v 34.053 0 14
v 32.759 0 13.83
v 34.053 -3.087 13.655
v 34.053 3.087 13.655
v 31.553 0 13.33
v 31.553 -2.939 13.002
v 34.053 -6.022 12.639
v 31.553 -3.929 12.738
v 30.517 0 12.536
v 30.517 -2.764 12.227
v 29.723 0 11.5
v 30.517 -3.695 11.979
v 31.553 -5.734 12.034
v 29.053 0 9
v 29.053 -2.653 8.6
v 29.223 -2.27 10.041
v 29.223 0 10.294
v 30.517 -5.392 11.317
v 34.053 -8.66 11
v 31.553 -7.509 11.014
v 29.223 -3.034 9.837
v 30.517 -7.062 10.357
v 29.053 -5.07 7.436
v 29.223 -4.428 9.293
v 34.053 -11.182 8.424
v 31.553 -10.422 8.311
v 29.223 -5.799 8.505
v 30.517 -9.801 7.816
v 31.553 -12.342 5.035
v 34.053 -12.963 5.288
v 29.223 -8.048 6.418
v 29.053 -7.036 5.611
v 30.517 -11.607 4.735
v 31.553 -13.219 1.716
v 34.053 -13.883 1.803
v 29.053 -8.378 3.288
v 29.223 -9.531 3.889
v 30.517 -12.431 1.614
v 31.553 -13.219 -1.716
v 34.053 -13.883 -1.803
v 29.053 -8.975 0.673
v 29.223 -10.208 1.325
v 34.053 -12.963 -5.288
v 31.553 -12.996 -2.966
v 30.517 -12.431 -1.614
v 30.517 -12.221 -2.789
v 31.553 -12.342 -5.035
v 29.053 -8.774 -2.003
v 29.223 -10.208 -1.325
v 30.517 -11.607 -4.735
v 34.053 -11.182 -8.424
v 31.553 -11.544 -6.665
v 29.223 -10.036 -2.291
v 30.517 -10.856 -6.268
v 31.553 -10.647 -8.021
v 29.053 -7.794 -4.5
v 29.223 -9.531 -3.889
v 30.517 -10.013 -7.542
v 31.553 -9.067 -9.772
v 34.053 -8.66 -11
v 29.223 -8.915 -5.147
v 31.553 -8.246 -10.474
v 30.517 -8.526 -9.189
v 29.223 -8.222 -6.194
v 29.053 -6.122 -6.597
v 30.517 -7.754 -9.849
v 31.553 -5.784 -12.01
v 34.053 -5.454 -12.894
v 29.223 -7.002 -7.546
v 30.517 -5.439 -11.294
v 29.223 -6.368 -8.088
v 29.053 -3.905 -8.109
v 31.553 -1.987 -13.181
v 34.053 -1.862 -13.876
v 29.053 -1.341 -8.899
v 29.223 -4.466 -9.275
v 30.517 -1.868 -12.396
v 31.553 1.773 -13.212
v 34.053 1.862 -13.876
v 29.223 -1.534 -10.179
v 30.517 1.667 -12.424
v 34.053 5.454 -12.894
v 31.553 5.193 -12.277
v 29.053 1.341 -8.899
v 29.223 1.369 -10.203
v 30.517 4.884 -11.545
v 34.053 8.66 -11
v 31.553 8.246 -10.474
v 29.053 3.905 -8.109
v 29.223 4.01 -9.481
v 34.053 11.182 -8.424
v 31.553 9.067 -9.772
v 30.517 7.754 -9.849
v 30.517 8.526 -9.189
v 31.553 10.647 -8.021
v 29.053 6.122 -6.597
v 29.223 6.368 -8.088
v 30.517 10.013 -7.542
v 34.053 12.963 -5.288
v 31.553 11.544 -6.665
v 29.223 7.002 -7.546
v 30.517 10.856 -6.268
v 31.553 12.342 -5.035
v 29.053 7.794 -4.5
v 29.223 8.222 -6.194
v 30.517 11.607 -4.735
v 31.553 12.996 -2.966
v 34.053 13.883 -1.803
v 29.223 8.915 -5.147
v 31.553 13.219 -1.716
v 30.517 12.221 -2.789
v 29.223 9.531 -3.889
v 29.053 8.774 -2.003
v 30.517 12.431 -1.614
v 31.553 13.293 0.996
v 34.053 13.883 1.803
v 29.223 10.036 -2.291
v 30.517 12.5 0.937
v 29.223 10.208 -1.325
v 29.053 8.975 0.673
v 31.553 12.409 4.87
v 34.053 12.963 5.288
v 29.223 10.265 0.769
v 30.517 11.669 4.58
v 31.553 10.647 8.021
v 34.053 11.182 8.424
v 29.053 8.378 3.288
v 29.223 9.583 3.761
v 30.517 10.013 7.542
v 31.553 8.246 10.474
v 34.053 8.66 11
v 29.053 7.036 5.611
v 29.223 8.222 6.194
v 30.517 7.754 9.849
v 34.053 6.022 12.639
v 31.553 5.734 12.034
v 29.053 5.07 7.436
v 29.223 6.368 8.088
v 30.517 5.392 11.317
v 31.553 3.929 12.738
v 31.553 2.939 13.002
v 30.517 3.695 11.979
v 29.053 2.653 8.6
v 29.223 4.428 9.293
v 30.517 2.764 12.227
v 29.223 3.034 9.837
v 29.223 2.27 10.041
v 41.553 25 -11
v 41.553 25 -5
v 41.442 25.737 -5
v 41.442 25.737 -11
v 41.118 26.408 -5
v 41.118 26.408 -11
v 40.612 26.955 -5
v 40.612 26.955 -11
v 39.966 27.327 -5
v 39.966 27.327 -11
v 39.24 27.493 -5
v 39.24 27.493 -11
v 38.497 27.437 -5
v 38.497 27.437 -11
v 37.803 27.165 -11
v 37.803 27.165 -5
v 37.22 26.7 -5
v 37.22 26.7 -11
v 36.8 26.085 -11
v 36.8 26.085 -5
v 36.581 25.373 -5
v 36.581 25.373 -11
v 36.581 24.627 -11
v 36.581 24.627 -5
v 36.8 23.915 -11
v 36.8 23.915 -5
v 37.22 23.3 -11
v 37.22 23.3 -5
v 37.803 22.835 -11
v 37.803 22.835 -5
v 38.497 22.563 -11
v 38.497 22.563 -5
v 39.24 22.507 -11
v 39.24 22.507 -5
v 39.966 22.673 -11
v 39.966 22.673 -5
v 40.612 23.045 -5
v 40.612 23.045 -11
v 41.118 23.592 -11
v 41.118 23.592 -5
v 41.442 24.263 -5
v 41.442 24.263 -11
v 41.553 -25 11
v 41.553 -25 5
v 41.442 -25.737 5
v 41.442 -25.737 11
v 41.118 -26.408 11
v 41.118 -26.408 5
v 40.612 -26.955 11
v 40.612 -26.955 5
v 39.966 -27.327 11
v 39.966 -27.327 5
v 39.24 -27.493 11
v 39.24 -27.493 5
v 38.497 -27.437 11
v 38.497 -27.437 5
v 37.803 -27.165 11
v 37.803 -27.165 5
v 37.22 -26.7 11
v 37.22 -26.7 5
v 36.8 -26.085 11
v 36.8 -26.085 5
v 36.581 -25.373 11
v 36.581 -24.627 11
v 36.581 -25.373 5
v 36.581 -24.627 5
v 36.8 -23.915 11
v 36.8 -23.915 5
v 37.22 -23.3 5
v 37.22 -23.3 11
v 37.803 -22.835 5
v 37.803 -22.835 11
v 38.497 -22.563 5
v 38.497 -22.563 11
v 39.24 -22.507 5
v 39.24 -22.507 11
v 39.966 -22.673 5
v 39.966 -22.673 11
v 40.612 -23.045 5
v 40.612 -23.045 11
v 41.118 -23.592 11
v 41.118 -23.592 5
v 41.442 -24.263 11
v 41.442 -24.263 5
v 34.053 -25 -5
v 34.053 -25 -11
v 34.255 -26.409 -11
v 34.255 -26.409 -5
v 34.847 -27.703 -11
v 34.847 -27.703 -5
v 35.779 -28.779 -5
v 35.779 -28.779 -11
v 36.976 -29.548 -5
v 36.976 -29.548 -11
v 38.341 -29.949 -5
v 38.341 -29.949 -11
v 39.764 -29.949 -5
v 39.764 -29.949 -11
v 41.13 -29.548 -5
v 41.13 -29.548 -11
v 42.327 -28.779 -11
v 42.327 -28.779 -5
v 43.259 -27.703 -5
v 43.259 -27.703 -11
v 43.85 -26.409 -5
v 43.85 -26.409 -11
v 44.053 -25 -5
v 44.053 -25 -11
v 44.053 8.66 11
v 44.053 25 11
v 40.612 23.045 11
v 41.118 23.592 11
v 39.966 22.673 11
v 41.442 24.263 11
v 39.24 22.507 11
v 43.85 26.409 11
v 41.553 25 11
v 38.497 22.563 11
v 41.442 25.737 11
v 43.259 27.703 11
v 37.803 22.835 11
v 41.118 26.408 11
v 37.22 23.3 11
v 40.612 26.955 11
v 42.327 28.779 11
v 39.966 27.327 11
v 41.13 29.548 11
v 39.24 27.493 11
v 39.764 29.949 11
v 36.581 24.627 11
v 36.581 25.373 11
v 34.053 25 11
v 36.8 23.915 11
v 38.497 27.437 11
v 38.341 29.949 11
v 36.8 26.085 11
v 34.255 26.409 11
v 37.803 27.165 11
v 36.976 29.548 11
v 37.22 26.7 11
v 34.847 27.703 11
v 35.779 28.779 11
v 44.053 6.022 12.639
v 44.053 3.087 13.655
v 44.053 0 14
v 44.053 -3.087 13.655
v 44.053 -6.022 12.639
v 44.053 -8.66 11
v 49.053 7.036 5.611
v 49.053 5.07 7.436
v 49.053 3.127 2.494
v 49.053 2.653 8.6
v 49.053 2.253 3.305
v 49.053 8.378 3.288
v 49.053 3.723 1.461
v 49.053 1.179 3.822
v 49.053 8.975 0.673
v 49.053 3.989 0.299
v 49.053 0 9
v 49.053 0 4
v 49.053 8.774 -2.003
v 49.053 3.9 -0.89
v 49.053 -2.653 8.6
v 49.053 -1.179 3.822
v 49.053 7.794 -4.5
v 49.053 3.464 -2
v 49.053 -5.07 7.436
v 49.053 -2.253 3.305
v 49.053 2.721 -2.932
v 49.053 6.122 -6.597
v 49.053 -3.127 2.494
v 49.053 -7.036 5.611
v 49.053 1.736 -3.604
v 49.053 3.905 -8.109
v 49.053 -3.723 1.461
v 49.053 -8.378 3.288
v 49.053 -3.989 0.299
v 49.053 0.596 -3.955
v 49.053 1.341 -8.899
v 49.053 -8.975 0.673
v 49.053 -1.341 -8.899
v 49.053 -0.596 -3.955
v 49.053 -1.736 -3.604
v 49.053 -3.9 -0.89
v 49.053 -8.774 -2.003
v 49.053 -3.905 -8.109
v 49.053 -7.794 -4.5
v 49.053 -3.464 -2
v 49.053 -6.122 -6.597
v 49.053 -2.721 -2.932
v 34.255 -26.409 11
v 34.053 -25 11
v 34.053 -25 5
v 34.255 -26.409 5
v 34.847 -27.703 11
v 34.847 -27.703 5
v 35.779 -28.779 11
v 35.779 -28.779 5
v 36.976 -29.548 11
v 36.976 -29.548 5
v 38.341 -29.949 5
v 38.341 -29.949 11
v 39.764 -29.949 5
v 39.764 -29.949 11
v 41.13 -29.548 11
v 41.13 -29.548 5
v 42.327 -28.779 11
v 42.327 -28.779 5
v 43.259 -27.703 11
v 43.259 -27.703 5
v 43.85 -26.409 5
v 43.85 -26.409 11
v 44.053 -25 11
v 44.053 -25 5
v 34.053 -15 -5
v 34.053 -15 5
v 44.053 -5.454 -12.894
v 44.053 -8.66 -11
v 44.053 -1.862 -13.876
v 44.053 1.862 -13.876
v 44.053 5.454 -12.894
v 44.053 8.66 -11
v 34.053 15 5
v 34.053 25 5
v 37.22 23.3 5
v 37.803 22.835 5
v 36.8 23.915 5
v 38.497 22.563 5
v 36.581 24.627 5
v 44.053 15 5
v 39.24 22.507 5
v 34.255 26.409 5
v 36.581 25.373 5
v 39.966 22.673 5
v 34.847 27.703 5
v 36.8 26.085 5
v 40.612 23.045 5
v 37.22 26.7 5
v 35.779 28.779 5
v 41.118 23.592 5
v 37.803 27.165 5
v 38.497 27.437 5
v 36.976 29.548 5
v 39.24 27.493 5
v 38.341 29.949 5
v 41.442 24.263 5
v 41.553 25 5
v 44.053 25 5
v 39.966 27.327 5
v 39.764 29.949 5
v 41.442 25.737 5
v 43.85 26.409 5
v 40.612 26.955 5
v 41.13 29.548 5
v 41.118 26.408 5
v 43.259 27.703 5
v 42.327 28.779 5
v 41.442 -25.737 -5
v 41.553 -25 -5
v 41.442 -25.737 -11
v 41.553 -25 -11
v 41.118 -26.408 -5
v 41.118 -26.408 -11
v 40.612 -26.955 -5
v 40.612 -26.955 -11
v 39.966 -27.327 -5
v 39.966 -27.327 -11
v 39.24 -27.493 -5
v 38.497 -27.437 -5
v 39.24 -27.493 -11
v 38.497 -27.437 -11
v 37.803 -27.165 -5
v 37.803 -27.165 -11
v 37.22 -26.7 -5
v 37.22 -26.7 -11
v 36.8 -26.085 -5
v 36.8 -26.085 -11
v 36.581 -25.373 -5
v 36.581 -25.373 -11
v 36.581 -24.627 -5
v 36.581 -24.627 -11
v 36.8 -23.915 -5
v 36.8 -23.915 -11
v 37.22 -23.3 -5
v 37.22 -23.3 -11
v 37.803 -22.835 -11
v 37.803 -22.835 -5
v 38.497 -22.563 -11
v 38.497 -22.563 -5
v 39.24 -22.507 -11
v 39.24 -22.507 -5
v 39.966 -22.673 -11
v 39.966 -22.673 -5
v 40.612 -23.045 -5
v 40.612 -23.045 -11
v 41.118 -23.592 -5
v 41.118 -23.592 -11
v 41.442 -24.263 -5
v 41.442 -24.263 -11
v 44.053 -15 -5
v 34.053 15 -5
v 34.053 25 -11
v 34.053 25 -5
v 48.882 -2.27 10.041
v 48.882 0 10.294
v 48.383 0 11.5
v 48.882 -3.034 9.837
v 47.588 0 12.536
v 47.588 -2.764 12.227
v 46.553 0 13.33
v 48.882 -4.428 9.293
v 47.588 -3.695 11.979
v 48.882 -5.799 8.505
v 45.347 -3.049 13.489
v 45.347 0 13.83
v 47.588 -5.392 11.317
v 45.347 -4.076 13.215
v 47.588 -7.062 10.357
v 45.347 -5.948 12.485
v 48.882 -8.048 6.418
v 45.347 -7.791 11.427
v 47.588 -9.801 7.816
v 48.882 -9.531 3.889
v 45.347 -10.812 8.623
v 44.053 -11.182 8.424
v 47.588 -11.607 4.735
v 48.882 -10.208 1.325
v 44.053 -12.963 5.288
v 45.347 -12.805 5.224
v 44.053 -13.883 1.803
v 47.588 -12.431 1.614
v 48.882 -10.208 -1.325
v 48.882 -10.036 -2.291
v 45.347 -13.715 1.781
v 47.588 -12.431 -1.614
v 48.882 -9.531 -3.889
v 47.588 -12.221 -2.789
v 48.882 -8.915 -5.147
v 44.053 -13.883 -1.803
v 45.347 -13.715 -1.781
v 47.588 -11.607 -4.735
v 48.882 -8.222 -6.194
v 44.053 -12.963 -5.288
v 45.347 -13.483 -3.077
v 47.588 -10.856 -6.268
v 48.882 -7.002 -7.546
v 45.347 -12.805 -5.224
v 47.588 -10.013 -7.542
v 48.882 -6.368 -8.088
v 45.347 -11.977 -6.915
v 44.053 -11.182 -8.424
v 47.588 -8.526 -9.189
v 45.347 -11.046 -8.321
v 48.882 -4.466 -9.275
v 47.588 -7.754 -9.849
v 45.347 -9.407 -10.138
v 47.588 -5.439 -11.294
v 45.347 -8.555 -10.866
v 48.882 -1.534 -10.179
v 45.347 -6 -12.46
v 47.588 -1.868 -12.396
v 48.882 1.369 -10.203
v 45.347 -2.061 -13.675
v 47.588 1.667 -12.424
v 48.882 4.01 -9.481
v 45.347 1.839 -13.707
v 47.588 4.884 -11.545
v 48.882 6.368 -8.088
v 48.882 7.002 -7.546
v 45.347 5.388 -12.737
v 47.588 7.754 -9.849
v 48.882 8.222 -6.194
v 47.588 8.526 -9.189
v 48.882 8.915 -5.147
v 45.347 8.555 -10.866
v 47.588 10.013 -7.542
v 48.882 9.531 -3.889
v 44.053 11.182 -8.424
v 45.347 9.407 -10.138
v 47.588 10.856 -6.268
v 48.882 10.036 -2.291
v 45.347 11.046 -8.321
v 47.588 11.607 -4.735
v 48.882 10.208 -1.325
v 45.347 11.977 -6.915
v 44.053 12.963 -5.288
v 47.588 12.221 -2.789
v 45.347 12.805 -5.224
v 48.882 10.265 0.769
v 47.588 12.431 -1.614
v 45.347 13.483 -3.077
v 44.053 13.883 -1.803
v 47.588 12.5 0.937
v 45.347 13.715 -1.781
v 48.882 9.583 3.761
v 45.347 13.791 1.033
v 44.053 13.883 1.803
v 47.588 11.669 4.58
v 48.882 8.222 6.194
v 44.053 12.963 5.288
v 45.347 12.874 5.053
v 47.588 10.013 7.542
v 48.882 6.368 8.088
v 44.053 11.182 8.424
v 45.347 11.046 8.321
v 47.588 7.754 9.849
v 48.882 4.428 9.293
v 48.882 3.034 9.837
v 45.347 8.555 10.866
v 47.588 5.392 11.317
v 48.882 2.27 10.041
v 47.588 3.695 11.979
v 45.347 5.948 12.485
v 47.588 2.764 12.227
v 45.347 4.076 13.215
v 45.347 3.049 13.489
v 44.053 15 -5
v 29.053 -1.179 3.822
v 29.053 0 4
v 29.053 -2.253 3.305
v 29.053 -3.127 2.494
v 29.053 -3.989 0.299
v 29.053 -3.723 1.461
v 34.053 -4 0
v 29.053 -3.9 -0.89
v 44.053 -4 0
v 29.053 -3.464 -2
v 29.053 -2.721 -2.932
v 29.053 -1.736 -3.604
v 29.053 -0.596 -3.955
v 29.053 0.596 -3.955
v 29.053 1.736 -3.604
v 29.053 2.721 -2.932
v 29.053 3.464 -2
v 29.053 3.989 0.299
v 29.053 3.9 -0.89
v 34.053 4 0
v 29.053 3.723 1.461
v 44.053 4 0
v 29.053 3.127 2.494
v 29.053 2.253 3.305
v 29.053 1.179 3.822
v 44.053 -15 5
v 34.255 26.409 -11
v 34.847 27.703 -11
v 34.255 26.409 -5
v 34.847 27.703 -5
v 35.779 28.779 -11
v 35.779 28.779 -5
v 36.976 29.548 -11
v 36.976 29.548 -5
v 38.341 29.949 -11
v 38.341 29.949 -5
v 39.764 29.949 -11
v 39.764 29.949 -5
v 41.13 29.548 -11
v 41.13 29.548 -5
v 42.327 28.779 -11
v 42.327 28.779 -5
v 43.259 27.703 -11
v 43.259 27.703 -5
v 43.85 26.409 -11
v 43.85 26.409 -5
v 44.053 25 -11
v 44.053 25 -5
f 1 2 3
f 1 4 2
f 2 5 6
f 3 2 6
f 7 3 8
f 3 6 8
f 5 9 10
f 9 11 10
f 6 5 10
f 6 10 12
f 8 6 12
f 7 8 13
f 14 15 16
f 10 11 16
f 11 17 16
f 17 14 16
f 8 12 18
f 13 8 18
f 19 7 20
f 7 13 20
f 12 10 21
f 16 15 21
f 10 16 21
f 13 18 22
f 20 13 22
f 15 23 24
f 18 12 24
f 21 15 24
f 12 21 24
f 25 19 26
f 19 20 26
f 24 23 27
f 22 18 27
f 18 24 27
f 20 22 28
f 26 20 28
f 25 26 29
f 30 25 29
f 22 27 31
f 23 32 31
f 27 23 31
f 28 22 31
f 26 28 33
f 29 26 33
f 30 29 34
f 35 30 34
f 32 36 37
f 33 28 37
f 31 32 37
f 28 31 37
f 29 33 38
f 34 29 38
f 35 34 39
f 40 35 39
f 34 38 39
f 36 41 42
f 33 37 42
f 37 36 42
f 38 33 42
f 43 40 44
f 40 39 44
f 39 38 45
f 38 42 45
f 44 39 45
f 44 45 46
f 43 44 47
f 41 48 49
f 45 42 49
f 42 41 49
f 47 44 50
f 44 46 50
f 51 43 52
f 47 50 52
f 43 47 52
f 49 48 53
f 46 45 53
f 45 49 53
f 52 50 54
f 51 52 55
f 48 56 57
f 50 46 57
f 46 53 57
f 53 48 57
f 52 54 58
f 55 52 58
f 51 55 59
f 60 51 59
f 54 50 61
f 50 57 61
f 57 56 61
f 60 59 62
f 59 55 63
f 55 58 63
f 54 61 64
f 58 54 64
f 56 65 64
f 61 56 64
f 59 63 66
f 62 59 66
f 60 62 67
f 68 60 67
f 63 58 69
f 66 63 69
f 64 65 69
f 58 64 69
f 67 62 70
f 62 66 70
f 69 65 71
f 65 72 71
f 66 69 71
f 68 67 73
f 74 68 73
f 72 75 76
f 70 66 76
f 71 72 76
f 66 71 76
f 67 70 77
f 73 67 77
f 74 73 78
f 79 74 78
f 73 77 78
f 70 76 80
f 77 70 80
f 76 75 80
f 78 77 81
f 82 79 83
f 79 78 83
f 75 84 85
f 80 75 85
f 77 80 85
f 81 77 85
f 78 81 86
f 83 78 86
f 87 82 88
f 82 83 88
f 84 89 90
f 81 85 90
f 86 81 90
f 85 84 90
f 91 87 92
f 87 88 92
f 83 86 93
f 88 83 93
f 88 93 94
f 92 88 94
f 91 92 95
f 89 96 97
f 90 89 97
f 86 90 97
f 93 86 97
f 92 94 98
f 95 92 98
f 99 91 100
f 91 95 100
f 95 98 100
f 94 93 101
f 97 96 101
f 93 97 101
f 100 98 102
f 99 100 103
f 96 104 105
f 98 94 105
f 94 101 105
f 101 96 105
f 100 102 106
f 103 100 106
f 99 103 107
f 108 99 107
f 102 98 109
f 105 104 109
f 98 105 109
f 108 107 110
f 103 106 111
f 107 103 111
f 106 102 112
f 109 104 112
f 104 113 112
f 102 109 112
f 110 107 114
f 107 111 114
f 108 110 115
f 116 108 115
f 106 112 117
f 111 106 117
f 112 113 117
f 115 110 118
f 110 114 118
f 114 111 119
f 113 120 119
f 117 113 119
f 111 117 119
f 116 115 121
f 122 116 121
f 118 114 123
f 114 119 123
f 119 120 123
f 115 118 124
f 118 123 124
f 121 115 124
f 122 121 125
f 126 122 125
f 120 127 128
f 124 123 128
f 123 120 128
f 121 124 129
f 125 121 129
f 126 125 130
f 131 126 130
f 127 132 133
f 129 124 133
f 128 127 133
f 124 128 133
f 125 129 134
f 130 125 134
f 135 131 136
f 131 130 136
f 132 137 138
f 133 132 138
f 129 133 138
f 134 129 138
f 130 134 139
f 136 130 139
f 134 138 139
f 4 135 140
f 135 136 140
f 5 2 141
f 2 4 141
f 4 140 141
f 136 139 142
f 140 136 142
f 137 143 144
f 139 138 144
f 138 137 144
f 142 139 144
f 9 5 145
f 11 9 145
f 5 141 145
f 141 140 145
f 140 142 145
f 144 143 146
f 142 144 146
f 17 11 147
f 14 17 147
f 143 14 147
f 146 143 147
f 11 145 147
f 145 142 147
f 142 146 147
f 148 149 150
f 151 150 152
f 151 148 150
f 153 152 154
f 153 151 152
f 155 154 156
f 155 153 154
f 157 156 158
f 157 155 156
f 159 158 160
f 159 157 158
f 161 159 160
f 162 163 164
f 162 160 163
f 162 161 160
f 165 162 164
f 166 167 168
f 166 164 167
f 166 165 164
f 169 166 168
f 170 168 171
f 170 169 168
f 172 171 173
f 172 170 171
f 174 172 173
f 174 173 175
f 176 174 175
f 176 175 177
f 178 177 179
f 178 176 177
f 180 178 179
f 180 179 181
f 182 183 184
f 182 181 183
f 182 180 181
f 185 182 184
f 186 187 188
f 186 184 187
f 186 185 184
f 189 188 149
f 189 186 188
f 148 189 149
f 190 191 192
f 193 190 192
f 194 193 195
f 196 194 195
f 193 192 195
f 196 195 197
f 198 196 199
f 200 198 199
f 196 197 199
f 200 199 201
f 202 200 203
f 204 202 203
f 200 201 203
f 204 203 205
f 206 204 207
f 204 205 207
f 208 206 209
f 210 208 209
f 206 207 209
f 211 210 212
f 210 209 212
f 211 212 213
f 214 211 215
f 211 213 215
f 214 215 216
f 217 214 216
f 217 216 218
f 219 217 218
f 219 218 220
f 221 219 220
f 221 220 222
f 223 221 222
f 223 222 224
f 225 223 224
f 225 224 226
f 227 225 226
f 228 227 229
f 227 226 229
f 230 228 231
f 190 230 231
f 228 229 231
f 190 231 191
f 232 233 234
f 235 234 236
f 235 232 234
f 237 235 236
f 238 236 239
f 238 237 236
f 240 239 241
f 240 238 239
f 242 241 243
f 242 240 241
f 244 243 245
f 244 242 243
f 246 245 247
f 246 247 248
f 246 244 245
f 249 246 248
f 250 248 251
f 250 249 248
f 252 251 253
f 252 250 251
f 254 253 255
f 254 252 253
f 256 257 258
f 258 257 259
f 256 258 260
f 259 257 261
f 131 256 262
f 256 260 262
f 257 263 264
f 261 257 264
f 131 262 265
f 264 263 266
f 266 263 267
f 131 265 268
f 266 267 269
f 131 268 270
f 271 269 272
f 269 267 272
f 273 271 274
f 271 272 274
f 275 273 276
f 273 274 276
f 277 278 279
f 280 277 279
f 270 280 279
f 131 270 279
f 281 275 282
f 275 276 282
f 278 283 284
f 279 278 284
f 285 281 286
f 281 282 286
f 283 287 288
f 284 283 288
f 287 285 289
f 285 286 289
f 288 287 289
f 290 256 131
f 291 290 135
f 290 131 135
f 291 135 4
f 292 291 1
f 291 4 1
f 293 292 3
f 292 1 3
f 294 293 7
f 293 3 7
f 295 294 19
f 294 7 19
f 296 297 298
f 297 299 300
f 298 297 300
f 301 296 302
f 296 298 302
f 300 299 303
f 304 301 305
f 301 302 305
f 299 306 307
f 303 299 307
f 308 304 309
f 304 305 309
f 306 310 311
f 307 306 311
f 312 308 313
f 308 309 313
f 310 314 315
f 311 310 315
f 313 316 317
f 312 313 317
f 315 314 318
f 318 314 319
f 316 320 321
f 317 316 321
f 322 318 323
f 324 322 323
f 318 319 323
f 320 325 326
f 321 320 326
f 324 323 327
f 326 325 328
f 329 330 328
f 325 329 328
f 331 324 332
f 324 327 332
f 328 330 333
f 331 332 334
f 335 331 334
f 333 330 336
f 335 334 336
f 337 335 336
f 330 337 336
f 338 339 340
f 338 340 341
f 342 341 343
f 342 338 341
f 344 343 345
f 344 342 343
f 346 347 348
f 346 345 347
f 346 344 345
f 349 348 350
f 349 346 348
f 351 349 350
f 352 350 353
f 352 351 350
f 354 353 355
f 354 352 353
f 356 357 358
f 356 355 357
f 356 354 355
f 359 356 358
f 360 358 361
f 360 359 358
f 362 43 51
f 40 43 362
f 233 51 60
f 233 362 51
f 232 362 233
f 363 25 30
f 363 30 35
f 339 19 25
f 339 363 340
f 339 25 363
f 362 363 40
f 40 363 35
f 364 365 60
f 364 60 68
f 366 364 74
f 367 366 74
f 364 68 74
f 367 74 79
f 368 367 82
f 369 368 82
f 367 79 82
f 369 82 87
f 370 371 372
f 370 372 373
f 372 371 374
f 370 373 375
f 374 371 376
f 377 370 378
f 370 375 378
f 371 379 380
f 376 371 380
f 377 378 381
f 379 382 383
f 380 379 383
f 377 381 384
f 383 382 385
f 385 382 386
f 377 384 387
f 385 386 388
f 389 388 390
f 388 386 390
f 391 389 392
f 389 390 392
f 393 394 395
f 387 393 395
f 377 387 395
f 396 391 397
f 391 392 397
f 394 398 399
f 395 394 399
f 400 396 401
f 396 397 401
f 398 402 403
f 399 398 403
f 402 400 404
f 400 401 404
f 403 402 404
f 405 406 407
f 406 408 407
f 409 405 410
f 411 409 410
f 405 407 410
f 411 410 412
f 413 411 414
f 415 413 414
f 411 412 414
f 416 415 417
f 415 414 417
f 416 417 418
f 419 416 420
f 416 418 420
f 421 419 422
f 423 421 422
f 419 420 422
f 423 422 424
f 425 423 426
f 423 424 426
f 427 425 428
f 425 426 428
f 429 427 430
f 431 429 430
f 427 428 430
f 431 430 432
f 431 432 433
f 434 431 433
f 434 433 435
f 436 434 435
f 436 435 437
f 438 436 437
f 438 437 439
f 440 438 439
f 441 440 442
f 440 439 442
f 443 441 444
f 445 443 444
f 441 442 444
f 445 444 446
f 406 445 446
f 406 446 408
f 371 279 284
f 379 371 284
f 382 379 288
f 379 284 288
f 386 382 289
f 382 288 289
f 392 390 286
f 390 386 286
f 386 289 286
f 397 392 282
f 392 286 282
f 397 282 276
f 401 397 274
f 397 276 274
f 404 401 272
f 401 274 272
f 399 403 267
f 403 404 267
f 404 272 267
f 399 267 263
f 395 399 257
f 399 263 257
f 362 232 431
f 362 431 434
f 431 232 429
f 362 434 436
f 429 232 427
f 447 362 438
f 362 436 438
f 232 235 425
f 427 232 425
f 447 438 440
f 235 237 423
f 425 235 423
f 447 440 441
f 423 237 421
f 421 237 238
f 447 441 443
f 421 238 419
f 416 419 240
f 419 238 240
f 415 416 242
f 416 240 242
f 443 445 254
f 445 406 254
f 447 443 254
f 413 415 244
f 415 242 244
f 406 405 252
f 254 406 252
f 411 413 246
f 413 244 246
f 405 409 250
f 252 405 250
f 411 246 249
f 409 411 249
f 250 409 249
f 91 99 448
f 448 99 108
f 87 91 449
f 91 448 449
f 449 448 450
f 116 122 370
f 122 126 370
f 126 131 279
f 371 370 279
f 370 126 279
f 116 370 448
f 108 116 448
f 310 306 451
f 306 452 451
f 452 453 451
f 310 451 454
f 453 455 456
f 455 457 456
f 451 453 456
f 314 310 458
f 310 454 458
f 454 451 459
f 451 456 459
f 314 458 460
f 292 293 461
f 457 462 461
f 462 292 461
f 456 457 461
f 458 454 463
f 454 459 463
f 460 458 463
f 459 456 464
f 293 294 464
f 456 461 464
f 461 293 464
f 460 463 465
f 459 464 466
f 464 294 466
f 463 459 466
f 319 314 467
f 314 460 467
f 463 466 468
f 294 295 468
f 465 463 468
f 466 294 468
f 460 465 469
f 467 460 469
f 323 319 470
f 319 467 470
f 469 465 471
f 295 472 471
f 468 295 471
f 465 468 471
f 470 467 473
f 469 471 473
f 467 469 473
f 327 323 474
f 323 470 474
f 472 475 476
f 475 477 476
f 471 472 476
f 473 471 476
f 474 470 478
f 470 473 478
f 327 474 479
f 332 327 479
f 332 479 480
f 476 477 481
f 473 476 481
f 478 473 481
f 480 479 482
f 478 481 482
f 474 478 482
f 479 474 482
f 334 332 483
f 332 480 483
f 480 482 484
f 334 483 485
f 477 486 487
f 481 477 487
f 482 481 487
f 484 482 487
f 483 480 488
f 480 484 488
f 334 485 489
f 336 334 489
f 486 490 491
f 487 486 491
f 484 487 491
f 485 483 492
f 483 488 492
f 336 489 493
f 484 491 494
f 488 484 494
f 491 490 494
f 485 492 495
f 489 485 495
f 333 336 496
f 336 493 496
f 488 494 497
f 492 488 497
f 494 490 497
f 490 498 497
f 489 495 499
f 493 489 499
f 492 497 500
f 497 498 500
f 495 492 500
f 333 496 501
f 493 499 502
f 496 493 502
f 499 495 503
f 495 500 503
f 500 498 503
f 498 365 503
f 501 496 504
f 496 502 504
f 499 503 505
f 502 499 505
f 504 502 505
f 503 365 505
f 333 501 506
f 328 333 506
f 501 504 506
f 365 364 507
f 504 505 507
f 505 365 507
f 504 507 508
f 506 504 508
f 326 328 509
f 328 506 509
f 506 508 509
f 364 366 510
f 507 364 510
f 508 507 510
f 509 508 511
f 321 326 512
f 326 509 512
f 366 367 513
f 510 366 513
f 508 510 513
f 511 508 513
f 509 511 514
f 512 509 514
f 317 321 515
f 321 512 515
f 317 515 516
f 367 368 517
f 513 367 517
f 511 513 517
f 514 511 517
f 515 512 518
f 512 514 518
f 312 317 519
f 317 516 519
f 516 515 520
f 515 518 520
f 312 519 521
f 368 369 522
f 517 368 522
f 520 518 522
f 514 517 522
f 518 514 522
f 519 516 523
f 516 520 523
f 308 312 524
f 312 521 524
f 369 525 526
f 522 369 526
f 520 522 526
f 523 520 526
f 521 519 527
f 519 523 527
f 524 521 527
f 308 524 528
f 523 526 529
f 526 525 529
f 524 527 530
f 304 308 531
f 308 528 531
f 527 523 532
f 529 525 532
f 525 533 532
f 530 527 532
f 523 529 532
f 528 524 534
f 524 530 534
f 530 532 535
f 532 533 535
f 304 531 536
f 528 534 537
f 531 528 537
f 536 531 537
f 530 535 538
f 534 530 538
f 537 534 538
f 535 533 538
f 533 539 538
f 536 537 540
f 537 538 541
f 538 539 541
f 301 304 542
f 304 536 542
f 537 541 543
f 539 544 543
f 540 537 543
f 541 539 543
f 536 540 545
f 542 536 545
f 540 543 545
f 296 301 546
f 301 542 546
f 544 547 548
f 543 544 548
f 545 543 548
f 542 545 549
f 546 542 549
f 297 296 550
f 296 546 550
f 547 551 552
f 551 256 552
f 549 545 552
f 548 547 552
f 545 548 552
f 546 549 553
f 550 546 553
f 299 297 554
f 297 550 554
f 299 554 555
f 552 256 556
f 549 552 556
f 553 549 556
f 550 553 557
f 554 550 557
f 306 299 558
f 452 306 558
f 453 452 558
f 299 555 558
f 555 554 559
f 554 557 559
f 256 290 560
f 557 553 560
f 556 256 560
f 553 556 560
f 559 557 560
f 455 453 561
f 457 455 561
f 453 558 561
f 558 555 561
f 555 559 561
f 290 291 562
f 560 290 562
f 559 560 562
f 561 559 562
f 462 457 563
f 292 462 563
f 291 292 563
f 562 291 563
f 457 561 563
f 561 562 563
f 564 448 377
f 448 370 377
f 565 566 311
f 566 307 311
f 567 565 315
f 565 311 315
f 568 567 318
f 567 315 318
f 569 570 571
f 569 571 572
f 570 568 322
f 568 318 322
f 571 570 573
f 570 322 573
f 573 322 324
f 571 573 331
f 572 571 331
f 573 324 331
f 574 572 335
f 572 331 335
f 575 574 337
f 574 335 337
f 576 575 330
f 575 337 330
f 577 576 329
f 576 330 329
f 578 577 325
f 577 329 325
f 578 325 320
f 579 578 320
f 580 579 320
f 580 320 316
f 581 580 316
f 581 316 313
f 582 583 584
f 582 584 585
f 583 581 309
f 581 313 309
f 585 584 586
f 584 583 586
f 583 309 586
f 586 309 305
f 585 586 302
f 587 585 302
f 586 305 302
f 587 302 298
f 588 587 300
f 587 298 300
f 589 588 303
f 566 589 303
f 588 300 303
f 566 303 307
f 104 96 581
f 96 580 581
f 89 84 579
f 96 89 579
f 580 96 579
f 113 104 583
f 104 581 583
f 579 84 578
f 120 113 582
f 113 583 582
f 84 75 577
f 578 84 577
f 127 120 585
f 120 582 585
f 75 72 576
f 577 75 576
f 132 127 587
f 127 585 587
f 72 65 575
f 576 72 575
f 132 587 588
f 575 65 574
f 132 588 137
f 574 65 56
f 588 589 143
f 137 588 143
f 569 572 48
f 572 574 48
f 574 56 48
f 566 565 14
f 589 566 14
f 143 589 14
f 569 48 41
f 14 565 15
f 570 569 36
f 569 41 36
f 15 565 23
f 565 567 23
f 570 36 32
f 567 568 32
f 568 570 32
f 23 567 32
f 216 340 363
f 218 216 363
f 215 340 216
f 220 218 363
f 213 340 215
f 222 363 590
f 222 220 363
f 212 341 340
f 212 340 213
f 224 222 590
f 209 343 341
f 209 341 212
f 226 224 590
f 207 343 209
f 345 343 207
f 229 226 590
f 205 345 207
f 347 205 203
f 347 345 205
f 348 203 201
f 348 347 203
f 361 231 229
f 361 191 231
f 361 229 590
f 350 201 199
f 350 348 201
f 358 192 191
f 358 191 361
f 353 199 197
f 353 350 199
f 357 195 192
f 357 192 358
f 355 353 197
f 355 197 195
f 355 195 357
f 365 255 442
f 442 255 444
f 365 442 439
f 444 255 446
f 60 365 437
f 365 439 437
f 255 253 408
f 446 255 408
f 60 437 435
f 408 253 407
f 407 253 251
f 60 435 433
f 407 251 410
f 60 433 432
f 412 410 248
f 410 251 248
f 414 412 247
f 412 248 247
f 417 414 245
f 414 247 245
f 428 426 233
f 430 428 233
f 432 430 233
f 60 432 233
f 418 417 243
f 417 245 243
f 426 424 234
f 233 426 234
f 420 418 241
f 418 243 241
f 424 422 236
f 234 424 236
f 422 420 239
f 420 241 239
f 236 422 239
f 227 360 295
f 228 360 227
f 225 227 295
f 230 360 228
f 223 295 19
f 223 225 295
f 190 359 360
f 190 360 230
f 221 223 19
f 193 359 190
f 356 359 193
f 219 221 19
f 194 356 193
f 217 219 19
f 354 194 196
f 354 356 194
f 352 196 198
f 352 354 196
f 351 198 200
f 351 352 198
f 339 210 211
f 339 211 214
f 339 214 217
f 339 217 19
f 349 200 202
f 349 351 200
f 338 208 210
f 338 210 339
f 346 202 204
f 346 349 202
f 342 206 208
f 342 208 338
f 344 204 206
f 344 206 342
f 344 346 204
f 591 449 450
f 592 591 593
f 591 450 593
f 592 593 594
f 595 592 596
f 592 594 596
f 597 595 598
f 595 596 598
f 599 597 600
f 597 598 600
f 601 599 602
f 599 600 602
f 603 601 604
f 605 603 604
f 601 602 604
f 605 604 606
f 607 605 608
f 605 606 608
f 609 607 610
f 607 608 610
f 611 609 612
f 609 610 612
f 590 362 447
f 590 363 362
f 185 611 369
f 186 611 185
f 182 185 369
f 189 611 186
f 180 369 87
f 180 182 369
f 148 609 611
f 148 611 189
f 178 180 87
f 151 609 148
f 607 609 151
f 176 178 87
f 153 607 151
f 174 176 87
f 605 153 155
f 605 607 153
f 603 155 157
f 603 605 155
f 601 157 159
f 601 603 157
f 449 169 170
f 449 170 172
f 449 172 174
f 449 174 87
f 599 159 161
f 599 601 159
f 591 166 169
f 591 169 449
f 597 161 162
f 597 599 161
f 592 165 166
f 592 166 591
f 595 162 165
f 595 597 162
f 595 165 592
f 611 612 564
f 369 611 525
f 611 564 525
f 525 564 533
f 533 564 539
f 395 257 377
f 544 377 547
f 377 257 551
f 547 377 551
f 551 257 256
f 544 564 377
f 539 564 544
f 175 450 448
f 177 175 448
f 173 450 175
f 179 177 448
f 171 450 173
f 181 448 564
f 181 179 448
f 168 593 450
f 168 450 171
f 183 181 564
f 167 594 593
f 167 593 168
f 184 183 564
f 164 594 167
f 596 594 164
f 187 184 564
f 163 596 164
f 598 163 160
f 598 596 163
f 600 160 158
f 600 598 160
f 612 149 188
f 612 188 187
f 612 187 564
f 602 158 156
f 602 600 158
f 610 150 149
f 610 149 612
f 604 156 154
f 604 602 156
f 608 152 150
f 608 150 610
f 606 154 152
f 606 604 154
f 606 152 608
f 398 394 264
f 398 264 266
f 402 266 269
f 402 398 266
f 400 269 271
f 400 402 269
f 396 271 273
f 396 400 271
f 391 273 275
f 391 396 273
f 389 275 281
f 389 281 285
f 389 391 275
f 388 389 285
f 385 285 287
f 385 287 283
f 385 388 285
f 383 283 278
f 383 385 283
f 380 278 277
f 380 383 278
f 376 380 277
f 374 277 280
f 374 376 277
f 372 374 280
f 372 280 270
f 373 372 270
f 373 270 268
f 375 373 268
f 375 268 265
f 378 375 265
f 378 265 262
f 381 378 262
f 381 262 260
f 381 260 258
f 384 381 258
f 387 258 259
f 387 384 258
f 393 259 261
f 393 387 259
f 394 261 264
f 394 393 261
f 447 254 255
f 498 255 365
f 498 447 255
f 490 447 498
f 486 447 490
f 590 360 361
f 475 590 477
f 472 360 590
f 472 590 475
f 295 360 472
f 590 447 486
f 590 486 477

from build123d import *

# Parameters (mm, degrees)
SKETCH_2_R          = 2.5
EXTRUDE_1_DEPTH     = 11
CUT_EXTRUDE_1_DEPTH = 5


with BuildPart() as part:
    # 草图2 → 凸台-拉伸1 (new, symmetric)
    with BuildSketch(Plane.XY):
        with BuildLine():
            Line((44.052861038, 4), (34.052861038, 4))
            Line((34.052861038, 4), (34.052861038, 25))
            ThreePointArc((34.052861038, 25), (39.052861038, 30), (44.052861038, 25))
            Line((44.052861038, 25), (44.052861038, 4))
        make_face()
        with Locations((39.052861038, 25)):
            Circle(SKETCH_2_R, mode=Mode.SUBTRACT)
    extrude_1 = extrude(amount=EXTRUDE_1_DEPTH, both=True)

    # 草图3 → 旋转2 (revolve)
    with BuildSketch(Plane.XY, mode=Mode.PRIVATE) as revolve_2_sk:
        with BuildLine():
            Line((29.052861038, 4), (49.052861038, 4))
            Line((49.052861038, 4), (49.052861038, 9))
            ThreePointArc((49.052861038, 9), (47.588394944, 12.535533906), (44.052861038, 14))
            Line((44.052861038, 14), (34.052861038, 14))
            ThreePointArc((34.052861038, 14), (30.517327132, 12.535533906), (29.052861038, 9))
            Line((29.052861038, 9), (29.052861038, 4))
        make_face()
    revolve(revolve_2_sk.sketch.rotate(Axis((27.632077349, 0, 0), (1, 0, 0)), 90), axis=Axis((27.632077349, 0, 0), (1, 0, 0)))

    # 草图4 → 切除-拉伸1 (cut, symmetric)
    with BuildSketch(Plane.XY):
        with BuildLine():
            Line((44.052861038, 15), (44.052861038, 25))
            ThreePointArc((44.052861038, 25), (39.052861038, 30), (34.052861038, 25))
            Line((34.052861038, 25), (34.052861038, 15))
            Line((34.052861038, 15), (44.052861038, 15))
        make_face()
    cut_extrude_1 = extrude(amount=CUT_EXTRUDE_1_DEPTH, both=True, mode=Mode.SUBTRACT)

    # 镜向3: 凸台-拉伸1, 切除-拉伸1 across plane
    add(extrude_1.mirror(Plane.ZX))
    add(cut_extrude_1.mirror(Plane.ZX), mode=Mode.SUBTRACT)


solid = part.part
